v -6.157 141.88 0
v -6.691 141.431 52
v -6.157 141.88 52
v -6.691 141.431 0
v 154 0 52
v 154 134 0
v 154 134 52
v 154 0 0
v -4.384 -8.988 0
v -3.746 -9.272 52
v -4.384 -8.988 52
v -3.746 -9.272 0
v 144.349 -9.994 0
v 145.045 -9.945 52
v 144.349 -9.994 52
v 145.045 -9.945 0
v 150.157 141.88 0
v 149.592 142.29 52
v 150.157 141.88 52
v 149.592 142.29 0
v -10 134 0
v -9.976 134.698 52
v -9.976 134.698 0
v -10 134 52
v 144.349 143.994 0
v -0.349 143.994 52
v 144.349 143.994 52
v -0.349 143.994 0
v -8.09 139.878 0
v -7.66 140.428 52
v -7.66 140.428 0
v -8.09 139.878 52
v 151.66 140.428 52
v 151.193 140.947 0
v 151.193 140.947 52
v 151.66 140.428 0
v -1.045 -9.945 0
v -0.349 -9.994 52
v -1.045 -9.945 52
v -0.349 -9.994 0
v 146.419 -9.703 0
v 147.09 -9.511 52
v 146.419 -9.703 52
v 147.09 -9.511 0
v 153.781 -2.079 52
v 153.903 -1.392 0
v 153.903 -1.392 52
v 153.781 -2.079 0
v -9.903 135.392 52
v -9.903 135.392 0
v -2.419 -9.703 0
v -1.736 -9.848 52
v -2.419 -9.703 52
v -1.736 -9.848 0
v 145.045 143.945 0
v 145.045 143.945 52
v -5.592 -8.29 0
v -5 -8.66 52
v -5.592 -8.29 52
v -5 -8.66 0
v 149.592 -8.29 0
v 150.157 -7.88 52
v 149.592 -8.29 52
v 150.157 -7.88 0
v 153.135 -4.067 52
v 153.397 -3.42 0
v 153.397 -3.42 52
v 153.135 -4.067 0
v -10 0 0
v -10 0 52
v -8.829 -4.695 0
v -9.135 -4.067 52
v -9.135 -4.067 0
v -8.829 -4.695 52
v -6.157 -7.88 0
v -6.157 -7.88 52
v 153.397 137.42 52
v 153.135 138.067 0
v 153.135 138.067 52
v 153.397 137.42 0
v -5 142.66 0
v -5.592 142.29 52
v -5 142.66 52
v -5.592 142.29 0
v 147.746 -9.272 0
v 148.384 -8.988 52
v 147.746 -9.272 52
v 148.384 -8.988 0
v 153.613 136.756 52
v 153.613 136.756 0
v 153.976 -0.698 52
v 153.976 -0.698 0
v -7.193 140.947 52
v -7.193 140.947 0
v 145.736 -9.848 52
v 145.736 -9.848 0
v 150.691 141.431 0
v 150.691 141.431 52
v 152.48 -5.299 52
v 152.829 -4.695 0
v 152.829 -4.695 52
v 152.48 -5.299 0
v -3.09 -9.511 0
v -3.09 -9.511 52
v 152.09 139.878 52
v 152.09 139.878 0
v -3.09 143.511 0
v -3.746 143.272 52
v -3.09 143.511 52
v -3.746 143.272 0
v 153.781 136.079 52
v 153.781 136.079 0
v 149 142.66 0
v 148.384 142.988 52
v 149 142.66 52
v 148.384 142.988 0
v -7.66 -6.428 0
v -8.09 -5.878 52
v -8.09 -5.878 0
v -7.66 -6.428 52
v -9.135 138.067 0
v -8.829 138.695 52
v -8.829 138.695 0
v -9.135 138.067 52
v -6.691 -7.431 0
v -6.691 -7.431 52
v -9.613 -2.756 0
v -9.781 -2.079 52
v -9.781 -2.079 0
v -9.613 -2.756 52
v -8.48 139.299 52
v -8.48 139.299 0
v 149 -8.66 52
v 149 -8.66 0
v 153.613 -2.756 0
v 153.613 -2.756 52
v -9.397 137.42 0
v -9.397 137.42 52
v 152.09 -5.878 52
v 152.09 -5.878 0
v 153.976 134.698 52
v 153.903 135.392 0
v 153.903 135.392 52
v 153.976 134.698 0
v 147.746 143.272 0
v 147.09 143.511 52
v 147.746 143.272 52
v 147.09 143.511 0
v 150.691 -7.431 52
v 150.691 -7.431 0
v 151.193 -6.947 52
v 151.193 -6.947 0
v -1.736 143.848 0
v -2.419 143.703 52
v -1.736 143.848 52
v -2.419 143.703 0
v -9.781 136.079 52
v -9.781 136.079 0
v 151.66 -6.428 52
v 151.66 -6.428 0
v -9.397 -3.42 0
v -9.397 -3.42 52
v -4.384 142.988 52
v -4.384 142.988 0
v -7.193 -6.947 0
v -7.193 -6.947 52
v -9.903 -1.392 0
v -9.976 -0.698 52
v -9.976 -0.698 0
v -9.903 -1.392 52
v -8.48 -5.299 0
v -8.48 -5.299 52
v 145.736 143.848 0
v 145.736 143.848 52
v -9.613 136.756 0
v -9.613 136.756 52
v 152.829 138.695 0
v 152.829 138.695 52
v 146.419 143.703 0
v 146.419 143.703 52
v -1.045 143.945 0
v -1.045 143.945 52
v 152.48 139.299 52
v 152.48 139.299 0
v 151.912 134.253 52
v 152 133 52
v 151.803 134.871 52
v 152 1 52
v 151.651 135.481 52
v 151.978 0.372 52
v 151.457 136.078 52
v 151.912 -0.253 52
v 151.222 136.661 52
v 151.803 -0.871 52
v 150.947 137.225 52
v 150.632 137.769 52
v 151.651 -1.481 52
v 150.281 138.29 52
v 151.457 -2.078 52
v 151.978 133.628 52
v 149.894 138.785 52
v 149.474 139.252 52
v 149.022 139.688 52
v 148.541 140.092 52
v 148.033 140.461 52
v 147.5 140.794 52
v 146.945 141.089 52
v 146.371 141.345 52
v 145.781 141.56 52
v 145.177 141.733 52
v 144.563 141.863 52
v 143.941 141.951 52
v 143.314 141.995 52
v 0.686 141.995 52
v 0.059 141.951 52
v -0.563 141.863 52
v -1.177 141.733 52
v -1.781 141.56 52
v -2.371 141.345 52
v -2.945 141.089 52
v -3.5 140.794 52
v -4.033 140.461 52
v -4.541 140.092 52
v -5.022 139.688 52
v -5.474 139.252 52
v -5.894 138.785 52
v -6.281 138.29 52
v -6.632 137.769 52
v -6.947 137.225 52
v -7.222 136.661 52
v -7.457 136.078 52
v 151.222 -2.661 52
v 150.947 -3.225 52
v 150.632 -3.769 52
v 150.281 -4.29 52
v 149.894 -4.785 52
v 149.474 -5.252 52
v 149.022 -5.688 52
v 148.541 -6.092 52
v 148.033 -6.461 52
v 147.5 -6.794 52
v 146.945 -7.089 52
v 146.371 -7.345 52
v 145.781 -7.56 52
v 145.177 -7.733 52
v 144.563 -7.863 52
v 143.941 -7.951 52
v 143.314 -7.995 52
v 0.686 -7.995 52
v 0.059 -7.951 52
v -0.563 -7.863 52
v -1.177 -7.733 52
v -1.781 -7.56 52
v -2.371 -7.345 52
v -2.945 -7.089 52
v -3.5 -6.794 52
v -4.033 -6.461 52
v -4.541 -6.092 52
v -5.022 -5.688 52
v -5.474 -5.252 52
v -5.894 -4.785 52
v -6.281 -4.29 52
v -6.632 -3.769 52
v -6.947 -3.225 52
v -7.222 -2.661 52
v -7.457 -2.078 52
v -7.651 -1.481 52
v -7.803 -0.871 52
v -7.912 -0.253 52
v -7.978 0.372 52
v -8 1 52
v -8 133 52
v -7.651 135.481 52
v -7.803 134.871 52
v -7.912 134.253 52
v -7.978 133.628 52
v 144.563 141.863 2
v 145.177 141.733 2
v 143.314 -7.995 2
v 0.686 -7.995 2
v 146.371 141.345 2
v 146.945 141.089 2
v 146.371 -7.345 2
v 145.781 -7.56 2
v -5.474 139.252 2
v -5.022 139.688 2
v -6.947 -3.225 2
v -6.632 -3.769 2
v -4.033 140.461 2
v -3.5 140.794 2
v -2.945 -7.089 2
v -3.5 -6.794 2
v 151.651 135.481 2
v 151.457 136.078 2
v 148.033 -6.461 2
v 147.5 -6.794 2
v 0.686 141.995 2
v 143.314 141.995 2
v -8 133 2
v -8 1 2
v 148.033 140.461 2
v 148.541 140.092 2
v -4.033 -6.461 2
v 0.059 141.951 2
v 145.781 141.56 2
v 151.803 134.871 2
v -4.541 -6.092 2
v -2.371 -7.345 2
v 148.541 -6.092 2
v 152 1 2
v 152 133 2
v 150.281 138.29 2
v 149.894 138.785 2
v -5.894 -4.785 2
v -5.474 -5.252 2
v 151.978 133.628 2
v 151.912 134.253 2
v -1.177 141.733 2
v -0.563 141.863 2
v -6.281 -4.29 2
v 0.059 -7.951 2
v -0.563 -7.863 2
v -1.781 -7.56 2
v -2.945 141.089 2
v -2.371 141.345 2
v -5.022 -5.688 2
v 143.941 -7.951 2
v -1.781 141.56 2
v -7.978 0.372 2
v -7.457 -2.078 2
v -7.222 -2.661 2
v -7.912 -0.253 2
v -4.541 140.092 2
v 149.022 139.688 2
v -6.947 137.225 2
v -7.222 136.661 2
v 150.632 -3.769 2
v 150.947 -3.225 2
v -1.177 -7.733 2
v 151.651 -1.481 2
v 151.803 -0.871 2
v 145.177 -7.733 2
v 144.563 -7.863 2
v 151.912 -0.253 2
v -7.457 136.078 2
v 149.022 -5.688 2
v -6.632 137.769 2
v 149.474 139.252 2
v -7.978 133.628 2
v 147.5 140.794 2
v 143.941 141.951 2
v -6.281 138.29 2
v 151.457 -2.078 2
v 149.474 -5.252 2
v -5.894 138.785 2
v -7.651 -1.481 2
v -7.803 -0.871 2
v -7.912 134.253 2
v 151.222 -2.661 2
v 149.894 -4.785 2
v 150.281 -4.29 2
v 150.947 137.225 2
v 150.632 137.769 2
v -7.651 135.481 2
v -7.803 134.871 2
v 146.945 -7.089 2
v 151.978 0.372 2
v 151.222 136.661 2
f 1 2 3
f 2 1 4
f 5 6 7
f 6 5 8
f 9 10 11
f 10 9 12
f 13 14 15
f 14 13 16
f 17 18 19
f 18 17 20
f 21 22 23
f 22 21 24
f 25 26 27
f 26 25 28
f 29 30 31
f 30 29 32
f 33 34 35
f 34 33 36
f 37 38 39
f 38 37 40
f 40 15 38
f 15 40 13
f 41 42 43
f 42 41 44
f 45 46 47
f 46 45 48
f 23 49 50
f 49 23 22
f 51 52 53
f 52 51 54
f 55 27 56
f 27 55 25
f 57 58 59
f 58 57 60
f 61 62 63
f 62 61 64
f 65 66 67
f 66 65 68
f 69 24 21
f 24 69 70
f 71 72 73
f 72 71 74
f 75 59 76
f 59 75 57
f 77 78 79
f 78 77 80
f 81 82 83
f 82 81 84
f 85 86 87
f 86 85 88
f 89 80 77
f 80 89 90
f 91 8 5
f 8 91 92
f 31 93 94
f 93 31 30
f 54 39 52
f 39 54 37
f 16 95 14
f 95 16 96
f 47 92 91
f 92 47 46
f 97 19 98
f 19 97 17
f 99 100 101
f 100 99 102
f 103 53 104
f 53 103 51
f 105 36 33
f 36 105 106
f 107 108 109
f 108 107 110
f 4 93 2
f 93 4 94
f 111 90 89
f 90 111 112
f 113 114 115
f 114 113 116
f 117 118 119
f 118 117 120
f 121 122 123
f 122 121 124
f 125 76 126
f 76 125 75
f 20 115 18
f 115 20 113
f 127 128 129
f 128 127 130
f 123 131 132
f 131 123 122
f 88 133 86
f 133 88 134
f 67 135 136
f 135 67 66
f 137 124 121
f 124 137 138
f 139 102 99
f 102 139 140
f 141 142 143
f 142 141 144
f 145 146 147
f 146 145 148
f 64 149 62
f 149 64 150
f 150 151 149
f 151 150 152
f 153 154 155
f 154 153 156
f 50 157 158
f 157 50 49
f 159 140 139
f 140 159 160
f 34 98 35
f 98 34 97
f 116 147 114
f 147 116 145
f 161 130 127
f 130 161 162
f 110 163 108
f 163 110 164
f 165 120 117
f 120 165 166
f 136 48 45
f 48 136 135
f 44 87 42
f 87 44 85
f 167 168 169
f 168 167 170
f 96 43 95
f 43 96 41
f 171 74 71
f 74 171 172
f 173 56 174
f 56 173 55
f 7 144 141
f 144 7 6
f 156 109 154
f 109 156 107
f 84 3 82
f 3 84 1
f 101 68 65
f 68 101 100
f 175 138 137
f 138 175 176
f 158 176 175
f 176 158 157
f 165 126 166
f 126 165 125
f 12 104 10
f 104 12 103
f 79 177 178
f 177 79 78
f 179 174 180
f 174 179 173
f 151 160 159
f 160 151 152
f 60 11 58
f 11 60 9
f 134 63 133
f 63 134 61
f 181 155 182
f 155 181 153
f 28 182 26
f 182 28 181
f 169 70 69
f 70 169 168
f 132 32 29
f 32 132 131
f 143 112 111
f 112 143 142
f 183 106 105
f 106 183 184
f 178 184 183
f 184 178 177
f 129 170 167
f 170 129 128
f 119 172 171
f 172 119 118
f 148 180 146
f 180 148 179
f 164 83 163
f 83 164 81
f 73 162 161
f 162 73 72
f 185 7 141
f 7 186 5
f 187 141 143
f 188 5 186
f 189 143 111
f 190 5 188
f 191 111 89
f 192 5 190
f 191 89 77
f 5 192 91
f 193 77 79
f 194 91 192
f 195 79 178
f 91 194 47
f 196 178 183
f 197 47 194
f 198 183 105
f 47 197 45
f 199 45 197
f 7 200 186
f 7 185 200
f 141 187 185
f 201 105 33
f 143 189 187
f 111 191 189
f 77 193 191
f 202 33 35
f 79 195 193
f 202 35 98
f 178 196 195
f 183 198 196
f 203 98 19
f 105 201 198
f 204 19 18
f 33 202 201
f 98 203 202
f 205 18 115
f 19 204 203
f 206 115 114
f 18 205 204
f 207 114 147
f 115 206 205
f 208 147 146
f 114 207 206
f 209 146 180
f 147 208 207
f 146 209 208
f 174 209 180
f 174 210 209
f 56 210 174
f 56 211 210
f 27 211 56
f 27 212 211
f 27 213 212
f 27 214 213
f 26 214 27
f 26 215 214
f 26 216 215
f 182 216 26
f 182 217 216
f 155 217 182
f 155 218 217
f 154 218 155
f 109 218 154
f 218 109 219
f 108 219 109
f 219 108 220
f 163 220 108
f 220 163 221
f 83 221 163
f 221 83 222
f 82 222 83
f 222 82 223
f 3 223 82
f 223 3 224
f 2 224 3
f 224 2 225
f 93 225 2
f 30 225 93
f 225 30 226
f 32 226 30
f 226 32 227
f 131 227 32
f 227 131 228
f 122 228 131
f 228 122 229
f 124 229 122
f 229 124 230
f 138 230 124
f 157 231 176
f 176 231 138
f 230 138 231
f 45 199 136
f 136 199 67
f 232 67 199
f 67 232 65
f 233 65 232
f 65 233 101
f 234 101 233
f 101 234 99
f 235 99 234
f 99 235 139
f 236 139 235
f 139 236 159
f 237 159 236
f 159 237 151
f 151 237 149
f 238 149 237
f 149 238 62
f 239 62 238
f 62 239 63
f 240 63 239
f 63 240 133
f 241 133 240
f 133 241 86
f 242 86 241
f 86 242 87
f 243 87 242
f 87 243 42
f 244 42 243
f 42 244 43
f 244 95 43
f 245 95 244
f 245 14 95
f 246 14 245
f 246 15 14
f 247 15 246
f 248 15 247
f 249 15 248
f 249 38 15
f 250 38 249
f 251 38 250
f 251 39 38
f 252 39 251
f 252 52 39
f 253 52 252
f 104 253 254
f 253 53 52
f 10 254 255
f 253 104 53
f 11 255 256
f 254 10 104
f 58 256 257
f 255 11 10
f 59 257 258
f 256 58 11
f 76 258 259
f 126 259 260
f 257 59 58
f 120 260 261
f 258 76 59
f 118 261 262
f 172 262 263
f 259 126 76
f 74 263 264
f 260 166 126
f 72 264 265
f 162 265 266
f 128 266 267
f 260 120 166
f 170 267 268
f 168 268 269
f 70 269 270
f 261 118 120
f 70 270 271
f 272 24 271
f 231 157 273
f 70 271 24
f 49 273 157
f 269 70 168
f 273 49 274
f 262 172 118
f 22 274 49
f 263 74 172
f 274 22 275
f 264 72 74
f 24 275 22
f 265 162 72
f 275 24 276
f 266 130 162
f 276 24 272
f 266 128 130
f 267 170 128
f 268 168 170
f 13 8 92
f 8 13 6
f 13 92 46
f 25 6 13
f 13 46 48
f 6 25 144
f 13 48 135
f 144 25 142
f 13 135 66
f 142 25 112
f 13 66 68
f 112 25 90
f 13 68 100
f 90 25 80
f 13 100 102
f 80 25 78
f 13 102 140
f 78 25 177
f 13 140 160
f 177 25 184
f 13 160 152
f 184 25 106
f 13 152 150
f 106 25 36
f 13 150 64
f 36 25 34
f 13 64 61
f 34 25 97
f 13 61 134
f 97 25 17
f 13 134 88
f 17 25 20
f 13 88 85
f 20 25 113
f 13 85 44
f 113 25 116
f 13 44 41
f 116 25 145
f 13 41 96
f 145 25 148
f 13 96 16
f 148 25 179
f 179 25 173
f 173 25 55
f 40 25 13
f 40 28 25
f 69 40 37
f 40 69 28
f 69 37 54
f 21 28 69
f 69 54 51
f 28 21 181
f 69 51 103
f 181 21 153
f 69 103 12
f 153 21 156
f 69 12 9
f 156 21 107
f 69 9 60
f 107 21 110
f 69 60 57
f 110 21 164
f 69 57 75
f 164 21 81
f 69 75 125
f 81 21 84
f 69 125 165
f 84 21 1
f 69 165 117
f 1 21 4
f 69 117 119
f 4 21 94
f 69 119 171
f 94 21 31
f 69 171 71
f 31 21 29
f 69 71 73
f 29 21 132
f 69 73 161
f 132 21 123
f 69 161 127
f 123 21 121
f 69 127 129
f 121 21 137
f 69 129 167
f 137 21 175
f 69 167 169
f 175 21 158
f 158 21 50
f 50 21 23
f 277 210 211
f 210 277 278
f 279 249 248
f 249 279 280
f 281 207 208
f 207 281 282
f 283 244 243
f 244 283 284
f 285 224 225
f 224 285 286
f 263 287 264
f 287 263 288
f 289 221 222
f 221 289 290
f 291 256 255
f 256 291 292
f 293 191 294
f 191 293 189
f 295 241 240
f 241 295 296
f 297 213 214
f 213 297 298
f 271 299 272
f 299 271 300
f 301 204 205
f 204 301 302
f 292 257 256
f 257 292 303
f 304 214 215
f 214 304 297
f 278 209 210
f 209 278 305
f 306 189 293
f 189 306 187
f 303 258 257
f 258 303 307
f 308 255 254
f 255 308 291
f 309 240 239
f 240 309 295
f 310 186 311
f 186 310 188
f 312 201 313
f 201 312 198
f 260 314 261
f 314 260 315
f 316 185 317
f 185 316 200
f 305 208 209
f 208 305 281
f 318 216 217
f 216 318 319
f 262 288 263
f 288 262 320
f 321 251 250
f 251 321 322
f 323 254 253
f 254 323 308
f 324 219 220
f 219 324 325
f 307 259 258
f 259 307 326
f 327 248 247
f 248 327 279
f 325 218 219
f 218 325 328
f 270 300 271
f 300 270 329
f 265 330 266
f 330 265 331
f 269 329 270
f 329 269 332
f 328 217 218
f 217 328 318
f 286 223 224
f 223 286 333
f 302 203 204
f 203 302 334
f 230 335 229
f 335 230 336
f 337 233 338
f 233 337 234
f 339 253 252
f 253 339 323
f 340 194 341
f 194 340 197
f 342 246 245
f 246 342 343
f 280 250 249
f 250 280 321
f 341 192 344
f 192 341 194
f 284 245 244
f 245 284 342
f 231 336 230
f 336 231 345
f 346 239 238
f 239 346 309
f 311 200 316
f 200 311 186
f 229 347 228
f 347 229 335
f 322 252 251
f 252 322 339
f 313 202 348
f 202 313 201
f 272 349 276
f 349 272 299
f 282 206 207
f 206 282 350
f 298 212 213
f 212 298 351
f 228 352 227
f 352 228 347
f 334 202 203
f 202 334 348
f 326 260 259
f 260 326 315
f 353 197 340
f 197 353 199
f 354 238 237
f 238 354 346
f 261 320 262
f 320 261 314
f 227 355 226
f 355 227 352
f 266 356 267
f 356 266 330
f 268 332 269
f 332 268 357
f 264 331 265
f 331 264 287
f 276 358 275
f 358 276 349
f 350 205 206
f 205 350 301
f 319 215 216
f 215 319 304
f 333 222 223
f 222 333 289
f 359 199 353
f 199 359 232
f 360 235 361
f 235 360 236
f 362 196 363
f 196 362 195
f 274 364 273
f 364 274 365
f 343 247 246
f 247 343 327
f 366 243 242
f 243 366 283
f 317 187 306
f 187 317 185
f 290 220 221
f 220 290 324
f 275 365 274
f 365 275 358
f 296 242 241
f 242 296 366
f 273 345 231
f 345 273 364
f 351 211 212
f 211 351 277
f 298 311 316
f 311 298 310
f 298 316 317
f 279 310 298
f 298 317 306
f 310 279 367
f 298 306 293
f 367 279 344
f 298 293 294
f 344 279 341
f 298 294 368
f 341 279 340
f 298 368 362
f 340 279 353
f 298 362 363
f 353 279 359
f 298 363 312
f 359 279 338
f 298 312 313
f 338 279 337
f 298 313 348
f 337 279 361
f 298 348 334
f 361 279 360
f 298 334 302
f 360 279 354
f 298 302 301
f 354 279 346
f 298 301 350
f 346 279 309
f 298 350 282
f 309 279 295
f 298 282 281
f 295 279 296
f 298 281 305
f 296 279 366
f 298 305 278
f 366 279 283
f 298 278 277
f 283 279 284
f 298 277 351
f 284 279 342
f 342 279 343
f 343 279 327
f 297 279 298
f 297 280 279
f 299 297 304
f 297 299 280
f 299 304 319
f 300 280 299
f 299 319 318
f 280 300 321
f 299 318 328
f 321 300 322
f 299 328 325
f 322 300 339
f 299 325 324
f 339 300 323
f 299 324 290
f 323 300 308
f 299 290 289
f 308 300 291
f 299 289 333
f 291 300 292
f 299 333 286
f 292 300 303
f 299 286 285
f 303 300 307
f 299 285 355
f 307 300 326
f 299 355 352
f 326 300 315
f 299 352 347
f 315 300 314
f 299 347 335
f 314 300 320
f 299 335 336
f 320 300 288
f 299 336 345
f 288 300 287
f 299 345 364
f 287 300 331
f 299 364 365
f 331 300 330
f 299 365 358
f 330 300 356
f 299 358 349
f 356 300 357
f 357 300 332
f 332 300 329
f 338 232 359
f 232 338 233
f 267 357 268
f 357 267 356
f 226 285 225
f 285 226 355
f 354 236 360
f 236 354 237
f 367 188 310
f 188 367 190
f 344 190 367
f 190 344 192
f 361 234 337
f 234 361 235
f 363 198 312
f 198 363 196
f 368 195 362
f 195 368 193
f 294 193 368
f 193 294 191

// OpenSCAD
$fn = 90;
module box (x=82,y=154,z=52,d=20,t=2)
{
    A = x-d;
    B = y-d;
    C = z;
    
    //%translate([-d/2,-d/2,0]) cube([x,y,z]);
    difference()
    {
        hull()
        {
            cylinder(d=d, h=C);
            translate([A,0,0]) cylinder(d=d, h=C);
            translate([A,B,0]) cylinder(d=d, h=C);
            translate([0,B,0]) cylinder(d=d, h=C);
        }
        
        translate([-t/2,-t/2,t])
        hull()
        {
            translate([t,t,0]) cylinder(d=d-t, h=C);
            translate([A,t,0]) cylinder(d=d-t, h=C);
            translate([A,B,0]) cylinder(d=d-t, h=C);
            translate([t,B,0]) cylinder(d=d-t, h=C);
        }
    }
}

//box();

module double_box()
{
    box(x=2*82,y=154,z=52,d=20,t=2);
}

double_box();
